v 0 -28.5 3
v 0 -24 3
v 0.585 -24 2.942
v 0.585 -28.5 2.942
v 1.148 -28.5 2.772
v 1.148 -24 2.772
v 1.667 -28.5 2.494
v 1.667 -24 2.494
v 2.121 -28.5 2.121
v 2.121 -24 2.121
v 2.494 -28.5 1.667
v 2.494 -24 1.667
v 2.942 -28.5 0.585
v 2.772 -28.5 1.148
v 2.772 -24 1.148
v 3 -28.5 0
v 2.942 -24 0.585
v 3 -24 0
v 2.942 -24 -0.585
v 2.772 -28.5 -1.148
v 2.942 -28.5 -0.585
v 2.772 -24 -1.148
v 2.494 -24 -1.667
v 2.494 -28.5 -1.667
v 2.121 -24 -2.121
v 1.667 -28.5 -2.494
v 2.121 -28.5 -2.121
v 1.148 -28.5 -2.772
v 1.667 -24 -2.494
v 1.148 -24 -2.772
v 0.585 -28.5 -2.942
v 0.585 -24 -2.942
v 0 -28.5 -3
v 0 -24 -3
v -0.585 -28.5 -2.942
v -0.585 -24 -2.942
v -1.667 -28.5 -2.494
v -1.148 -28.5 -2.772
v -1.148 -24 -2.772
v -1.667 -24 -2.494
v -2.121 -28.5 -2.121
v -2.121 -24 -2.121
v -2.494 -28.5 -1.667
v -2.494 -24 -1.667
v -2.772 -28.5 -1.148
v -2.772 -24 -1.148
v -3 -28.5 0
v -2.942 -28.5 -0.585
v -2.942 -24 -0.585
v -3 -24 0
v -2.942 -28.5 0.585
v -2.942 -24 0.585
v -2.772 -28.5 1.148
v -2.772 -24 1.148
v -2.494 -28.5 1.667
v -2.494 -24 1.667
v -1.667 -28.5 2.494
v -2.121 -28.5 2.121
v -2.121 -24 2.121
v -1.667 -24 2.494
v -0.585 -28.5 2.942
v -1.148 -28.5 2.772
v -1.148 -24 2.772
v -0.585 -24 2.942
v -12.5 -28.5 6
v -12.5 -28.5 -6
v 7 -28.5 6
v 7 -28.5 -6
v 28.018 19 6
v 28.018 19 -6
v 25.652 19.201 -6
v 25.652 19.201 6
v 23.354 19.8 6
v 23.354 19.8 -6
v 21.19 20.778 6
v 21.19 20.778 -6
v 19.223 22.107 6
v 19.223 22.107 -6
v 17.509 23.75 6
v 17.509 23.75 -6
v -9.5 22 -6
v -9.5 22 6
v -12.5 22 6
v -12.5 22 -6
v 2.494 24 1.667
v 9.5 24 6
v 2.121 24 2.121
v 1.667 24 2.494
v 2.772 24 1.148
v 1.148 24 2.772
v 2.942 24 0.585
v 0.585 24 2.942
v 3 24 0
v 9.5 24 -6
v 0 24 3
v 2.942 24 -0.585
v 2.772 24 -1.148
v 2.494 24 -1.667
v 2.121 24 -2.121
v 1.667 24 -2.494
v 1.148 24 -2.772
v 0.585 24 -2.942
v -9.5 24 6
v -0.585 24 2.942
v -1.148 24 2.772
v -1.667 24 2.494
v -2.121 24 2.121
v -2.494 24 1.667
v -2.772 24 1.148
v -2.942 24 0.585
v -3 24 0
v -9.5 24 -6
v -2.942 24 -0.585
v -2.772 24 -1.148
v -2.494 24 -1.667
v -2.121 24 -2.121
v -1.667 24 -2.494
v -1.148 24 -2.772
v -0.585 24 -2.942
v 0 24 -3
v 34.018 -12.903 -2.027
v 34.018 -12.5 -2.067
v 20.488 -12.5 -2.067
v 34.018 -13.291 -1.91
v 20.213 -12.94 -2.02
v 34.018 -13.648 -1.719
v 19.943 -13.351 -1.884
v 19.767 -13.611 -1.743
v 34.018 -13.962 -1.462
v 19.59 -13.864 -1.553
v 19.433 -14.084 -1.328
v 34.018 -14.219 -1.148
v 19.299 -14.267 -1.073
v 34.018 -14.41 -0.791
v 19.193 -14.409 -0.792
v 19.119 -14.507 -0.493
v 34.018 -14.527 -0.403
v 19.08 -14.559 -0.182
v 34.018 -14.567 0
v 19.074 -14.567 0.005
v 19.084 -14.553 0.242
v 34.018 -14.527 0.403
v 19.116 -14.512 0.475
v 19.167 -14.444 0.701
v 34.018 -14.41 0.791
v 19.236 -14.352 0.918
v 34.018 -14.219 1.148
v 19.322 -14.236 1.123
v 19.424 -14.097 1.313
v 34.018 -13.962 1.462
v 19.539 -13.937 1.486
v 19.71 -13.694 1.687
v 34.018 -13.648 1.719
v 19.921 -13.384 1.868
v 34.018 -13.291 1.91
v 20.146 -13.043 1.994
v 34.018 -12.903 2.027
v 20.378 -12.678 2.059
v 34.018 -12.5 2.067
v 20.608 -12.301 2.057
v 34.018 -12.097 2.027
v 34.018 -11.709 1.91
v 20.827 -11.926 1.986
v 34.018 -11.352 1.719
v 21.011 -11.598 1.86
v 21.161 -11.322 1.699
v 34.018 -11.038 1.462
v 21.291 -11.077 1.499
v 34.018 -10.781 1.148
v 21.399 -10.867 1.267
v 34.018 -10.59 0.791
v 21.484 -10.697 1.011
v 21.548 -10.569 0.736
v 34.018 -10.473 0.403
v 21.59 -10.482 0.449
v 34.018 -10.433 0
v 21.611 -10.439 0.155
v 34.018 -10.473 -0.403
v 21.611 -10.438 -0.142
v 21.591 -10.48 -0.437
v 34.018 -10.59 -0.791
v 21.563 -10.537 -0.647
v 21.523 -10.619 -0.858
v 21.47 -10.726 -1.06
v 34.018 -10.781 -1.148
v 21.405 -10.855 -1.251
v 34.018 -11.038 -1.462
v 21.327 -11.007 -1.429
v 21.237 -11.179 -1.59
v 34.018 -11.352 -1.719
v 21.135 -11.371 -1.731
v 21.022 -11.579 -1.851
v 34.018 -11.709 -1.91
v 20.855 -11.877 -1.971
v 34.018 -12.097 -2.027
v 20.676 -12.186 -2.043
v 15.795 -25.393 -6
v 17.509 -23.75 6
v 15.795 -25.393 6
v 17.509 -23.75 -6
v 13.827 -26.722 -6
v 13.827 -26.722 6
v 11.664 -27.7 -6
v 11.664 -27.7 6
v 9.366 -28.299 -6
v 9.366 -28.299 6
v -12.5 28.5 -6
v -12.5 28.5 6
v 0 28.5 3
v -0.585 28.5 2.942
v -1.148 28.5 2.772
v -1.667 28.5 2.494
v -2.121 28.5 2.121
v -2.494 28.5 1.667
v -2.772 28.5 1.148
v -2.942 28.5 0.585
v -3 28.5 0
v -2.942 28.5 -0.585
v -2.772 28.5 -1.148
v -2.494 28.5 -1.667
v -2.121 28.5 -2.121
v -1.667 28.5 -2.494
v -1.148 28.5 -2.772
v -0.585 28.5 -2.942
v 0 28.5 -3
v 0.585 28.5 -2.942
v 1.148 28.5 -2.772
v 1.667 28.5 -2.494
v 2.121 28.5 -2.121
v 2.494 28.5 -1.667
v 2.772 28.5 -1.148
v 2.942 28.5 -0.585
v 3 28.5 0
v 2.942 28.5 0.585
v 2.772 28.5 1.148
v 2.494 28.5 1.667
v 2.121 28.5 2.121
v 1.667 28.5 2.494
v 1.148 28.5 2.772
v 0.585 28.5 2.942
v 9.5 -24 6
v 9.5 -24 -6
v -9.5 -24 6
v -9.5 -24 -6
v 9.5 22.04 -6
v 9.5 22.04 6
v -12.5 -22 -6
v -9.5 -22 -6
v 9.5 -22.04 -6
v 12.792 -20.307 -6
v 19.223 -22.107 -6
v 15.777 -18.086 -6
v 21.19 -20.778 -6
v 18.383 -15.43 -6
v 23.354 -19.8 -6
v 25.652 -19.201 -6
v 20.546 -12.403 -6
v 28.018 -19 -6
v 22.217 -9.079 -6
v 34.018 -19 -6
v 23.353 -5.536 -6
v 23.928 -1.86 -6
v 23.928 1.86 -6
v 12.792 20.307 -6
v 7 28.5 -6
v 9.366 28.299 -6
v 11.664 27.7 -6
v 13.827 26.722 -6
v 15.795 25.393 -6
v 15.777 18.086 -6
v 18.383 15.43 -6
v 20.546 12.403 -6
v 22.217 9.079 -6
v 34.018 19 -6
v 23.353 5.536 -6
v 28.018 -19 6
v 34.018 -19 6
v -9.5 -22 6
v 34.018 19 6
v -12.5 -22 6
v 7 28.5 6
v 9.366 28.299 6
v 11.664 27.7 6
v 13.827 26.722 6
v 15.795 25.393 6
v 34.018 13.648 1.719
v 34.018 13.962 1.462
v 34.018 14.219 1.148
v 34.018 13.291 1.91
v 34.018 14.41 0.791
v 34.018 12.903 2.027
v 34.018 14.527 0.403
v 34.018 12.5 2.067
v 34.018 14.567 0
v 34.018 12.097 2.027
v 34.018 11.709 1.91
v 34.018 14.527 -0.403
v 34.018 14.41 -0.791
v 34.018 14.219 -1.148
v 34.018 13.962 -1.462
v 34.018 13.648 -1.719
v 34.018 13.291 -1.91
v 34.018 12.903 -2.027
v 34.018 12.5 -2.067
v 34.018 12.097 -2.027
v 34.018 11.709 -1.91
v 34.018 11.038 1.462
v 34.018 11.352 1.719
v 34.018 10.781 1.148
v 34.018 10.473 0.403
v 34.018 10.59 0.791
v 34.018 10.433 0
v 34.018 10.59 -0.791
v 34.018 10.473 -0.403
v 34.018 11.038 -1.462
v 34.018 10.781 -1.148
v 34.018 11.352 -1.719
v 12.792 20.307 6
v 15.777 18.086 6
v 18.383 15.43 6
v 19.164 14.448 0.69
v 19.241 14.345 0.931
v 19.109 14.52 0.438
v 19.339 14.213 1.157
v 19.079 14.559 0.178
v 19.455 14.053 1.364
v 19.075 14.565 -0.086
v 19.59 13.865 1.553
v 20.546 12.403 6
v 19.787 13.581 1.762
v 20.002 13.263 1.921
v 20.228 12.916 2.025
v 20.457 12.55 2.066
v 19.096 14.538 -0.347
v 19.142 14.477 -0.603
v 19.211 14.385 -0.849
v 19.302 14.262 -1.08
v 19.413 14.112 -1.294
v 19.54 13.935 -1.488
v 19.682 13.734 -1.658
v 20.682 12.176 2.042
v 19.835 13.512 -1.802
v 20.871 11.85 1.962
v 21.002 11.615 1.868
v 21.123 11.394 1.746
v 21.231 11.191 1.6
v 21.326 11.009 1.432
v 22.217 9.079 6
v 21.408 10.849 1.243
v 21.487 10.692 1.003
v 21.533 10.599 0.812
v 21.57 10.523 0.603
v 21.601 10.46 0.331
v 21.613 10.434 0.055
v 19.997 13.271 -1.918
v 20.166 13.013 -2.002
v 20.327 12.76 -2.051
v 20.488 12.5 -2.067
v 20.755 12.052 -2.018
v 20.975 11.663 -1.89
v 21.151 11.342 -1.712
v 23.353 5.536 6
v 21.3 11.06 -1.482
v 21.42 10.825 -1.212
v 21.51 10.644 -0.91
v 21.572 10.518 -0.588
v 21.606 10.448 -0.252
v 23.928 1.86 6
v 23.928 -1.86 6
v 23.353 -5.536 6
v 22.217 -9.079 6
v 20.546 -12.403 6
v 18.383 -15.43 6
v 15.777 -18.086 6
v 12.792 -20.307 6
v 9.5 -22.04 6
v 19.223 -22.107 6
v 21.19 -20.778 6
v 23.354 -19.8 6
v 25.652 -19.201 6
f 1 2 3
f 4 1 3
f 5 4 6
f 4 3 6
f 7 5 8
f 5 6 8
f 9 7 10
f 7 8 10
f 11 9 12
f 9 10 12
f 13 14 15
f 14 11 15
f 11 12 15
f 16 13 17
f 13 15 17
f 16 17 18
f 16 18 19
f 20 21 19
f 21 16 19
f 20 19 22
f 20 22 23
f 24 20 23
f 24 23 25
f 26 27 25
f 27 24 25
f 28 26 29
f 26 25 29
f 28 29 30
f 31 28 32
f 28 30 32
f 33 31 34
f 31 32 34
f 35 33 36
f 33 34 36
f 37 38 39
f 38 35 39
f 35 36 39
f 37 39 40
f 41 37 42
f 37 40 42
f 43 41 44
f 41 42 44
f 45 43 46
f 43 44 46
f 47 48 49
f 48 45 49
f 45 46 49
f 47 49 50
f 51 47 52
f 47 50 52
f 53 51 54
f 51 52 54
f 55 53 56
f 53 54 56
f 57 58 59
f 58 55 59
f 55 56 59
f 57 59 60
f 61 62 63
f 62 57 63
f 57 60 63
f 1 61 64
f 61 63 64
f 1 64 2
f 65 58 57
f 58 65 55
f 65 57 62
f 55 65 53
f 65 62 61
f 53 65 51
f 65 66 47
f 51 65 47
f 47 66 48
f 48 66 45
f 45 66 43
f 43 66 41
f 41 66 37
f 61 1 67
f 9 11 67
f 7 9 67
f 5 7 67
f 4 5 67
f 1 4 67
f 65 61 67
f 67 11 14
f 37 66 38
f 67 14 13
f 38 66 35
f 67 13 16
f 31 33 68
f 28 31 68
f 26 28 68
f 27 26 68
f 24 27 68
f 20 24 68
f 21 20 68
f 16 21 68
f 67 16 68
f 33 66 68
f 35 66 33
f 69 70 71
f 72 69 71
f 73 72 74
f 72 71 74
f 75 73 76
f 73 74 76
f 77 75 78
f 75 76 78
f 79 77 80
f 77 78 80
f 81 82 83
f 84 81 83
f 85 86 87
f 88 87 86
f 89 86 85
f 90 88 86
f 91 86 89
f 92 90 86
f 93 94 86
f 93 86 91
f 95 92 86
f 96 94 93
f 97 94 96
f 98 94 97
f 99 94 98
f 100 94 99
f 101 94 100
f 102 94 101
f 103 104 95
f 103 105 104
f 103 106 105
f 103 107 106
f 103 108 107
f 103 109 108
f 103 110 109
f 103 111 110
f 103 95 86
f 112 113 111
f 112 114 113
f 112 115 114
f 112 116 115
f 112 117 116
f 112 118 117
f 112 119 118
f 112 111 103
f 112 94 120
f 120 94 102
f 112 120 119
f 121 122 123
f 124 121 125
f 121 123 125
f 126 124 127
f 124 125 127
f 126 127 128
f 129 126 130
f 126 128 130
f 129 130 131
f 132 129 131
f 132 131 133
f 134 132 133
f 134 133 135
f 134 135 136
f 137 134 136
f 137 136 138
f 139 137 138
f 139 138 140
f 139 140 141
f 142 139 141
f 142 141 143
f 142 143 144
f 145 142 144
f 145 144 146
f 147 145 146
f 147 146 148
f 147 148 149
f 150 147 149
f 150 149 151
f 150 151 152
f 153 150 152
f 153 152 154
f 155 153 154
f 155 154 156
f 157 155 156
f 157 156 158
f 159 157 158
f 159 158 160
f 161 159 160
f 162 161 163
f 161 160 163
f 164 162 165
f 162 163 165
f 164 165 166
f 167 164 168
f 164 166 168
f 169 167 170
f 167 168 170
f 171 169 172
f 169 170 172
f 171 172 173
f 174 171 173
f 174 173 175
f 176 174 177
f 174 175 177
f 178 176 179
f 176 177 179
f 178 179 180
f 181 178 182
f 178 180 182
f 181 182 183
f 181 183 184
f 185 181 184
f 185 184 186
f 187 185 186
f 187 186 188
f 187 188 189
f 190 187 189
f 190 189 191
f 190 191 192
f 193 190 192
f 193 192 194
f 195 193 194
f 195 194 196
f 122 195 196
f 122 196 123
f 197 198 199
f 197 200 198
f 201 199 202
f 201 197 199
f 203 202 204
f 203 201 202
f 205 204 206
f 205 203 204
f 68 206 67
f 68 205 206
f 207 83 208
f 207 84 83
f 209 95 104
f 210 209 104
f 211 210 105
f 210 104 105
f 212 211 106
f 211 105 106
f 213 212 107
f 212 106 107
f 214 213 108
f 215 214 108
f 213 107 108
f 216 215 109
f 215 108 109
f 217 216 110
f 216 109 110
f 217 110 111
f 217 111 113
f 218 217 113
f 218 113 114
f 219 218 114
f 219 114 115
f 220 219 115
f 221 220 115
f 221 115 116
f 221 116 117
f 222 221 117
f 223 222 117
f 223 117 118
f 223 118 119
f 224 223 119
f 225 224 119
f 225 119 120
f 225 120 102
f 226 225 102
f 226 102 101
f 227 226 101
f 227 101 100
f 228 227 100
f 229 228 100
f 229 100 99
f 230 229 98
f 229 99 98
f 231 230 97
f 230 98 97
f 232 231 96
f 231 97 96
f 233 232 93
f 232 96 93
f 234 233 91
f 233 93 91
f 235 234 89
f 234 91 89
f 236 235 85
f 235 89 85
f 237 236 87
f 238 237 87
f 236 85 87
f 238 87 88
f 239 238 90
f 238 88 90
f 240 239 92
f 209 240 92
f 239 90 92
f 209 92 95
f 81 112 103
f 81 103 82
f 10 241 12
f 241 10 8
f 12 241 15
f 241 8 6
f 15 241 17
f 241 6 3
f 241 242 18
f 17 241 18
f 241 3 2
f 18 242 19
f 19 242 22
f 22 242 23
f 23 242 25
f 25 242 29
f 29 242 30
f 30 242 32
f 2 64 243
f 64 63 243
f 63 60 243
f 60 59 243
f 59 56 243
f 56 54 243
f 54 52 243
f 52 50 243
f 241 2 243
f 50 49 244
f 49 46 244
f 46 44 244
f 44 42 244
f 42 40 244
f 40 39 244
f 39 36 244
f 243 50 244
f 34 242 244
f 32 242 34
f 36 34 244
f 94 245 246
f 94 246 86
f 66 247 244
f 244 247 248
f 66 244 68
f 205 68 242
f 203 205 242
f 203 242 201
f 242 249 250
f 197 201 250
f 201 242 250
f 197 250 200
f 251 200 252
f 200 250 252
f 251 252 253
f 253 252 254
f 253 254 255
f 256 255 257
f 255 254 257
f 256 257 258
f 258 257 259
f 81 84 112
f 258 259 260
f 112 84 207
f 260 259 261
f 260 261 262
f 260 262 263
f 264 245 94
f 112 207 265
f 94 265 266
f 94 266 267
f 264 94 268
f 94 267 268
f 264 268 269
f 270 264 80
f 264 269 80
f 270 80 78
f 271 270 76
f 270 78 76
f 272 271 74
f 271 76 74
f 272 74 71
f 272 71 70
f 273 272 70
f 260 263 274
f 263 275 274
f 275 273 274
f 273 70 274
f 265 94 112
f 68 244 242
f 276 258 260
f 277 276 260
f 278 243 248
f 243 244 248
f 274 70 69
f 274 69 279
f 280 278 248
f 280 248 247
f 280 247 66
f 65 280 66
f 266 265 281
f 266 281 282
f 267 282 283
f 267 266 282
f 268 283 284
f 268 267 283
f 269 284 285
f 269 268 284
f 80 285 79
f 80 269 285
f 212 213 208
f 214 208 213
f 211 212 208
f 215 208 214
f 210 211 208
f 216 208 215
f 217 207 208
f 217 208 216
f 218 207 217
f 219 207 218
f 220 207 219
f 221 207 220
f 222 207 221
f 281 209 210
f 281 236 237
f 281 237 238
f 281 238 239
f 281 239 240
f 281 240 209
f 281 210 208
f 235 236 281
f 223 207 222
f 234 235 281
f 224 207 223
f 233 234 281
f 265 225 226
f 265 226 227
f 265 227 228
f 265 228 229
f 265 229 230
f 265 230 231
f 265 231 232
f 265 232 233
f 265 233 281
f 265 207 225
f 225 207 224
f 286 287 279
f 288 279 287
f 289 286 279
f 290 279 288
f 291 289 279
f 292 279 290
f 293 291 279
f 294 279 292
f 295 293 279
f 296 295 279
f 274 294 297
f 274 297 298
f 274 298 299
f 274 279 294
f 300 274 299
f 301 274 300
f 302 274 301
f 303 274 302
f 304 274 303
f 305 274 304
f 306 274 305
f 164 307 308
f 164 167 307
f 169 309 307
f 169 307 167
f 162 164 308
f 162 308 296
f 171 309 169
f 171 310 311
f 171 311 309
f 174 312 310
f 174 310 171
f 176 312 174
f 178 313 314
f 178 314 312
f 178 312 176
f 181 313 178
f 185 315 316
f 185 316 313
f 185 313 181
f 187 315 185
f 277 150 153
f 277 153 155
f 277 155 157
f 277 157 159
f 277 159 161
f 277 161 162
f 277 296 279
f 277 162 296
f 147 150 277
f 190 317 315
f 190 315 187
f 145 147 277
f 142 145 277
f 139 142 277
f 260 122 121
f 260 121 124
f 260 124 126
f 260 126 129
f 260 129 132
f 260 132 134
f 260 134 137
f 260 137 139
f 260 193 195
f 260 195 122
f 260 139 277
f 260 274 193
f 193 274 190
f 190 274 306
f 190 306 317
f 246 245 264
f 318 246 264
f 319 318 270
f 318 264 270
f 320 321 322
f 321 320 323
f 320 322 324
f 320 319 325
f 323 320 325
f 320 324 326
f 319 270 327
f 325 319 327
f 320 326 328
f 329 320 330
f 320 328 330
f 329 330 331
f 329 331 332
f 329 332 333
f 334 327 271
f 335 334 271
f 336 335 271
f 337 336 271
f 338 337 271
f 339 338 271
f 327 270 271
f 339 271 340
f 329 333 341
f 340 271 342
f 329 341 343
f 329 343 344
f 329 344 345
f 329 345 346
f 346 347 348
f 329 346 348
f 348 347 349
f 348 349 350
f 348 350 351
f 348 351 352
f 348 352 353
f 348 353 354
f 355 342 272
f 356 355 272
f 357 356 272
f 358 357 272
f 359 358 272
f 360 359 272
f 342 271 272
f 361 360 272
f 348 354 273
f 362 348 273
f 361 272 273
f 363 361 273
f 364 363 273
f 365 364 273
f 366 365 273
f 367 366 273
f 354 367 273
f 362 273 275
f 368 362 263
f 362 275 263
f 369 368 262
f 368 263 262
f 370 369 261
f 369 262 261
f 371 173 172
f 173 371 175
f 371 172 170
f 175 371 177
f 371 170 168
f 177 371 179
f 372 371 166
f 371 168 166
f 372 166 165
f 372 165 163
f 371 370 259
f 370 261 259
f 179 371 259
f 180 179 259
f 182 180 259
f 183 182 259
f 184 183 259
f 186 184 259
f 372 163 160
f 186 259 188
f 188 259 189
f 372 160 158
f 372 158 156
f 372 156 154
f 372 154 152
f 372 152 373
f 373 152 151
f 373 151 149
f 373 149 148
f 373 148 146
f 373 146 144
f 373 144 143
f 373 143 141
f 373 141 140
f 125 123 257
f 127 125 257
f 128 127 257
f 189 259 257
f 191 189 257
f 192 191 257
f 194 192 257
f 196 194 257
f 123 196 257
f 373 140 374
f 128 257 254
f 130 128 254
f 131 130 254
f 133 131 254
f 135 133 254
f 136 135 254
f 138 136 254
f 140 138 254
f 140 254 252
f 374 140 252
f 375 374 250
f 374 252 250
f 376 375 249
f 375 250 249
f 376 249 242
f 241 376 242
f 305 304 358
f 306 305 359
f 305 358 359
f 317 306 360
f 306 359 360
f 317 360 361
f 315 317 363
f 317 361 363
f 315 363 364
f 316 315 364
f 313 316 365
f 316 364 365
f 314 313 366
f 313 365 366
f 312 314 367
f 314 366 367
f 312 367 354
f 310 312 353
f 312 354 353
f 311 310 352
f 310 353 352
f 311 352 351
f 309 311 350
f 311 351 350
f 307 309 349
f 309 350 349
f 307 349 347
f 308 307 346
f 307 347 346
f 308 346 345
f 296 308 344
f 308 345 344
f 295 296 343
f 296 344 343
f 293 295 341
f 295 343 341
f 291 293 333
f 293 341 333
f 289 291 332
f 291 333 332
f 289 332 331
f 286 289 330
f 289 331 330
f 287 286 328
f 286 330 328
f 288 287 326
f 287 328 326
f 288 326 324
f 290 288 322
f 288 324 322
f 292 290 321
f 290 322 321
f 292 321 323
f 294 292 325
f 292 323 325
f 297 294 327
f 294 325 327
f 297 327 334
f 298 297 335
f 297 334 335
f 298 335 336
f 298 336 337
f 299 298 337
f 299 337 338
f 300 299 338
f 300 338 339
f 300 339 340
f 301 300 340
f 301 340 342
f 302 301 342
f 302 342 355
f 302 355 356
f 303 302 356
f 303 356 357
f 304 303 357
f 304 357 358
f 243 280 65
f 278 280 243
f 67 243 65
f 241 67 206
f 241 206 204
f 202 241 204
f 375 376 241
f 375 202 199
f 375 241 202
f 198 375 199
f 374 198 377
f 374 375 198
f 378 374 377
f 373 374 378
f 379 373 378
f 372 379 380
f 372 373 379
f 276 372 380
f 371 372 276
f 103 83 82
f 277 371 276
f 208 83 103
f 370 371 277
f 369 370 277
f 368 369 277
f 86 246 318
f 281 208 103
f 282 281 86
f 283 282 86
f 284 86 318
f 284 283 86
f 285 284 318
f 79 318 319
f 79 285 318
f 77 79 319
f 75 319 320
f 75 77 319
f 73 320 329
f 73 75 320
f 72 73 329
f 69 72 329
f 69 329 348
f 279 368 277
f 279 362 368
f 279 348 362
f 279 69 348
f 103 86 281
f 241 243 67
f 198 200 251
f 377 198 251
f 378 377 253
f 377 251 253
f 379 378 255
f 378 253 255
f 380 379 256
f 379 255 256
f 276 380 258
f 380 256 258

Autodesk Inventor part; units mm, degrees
ref_plane "YZ Plane" through (0, 0, 0) normal (1, 0, 0) x (0, 1, 0)
ref_plane "XZ Plane" through (0, 0, 0) normal (0, 1, 0) x (-1, 0, 0)
ref_plane "XY Plane" through (0, 0, 0) normal (0, 0, 1) x (1, 0, 0)
sketch "Sketch1" plane through (0, 0, 0) normal (0, 0, 1) x (1, 0, 0)
  arc A0 (9.5, -22.0397) -> (9.5, 22.0397) centre (0, 0) ccw
  line L0 (-9.5, 22) -> (-9.5, -22) construction
  line L1 (9.5, 22.0397) -> (9.5, -22.0397) construction
  line L2 (9.5, 22.0397) -> (9.5, 24)
  line L3 (9.5, 24) -> (-9.5, 24)
  line L4 (-9.5, 24) -> (-9.5, 22)
  line L5 (-9.5, 22) -> (-12.5, 22)
  line L6 (-12.5, 22) -> (-12.5, 28.5)
  arc A1 (17.5089, 23.75) -> (28.0178, 19) centre (28.0178, 33) ccw
  line L7 (28.0178, 19) -> (34.0178, 19)
  line L8 (34.0178, 19) -> (34.0178, -19)
  line L9 (9.5, -22.0397) -> (9.5, -24)
  line L10 (9.5, -24) -> (-9.5, -24)
  line L11 (-9.5, -24) -> (-9.5, -22)
  line L12 (-12.5, -22) -> (-12.5, -28.5)
  line L13 (-9.5, -22) -> (-12.5, -22)
  arc A2 (28.0178, -19) -> (17.5089, -23.75) centre (28.0178, -33) ccw
  line L14 (28.0178, -19) -> (34.0178, -19)
  line L15 (-12.5, 28.5) -> (7, 28.5)
  arc A3 (17.5089, 23.75) -> (7, 28.5) centre (7, 14.5) ccw
  line L16 (-12.5, -28.5) -> (7, -28.5)
  arc A4 (7, -28.5) -> (17.5089, -23.75) centre (7, -14.5) ccw
  point P0 (9.5, 0)
  point P1 (0, -24)
  point P2 (0, 24)
  point P3 (-2.75, 28.5)
  point P4 (-2.75, -28.5)
  dimension "d0" = 48
  dimension "d1" = 9.5
  dimension "d2" = 9.5
  dimension "d3" = 38
  dimension "d4" = 19
  dimension "d7" = 14
  dimension "d8" = 14
  dimension "d9" = 14
  dimension "d10" = 7
  dimension "d11" = 14
  dimension "d12" = 7
  dimension "d13" = 12.5
  dimension "d14" = 12.5
  dimension "d15" = 4.5
  dimension "d16" = 4.5
  dimension "d17" = 2
  dimension "d18" = 2
  dimension "d19" = 24
  dimension "d20" = 24
  dimension "d21" = 6
extrude "Extrusion1" add sketch "Sketch1" along normal mid plane 12
sketch "Sketch2" plane through (34.0178, -19, 6) normal (1, 0, 0) x (0, 0, -1)
  point P0 (6, 19)
  point P1 (6, 31.5)
  point P2 (6, 6.5)
  dimension "d31" = 25
  dimension "d32" = 12.5
hole "Hole1" at (34.0178, 12.5, 0) at (34.0178, -12.5, 0) direction (-1, 0, 0) diameter 4.134 end through all thread size "M5x0.8" class "6H" standard "ISO Metric profile"
sketch "Sketch3" plane through (-12.5, 28.5, 6) normal (0, 1, 0) x (1, 0, 0)
  line L0 (0, 12) -> (0, 0) projected
  point P0 (12.5, 6)
  point P1 (12.5, 6)
  point P2 (0, 6)
  point P3 (0, 6)
  dimension "d40" = 12.5
hole "Hole2" at (0, 28.5, 0) direction (0, -1, 0) diameter 6 depth 4.5
mirror "Mirror1" about plane through (0, 0, 0) normal (0, 1, 0) of "Hole2"
equation "\"d4\" = 0.5 * d3"
equation "\"d7\" = d5"
equation "\"d8\" = d5"
equation "\"d12\" = d10"
equation "\"d14\" = d13"
equation "\"d16\" = d15"
equation "\"d20\" = d19"
equation "\"d32\" = 0.5 * d31"
equation "\"d5\" = 14"
properties part number "102 new"
